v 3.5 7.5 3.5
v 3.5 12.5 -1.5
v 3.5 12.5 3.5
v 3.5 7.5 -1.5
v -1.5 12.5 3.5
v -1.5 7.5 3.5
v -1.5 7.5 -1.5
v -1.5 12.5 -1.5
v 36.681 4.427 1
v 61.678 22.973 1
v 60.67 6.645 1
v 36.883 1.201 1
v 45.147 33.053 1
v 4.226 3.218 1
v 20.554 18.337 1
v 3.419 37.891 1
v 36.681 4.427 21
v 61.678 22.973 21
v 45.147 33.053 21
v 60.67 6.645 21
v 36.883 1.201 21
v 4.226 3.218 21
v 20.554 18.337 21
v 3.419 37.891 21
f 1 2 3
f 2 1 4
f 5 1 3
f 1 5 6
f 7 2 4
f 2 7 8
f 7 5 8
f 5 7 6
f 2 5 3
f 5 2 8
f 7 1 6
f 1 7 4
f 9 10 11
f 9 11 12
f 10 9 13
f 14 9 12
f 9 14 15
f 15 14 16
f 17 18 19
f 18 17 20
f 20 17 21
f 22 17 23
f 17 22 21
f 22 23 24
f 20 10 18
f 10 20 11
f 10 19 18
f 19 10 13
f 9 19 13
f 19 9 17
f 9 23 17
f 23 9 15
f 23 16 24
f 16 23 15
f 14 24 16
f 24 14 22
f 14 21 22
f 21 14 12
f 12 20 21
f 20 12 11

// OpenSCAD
	translate([1, 10, 1])
		cube([5, 5, 5], center = true);
	translate([1, 1, 1])
		linear_extrude(height = 20) import("triangle.dxf");
